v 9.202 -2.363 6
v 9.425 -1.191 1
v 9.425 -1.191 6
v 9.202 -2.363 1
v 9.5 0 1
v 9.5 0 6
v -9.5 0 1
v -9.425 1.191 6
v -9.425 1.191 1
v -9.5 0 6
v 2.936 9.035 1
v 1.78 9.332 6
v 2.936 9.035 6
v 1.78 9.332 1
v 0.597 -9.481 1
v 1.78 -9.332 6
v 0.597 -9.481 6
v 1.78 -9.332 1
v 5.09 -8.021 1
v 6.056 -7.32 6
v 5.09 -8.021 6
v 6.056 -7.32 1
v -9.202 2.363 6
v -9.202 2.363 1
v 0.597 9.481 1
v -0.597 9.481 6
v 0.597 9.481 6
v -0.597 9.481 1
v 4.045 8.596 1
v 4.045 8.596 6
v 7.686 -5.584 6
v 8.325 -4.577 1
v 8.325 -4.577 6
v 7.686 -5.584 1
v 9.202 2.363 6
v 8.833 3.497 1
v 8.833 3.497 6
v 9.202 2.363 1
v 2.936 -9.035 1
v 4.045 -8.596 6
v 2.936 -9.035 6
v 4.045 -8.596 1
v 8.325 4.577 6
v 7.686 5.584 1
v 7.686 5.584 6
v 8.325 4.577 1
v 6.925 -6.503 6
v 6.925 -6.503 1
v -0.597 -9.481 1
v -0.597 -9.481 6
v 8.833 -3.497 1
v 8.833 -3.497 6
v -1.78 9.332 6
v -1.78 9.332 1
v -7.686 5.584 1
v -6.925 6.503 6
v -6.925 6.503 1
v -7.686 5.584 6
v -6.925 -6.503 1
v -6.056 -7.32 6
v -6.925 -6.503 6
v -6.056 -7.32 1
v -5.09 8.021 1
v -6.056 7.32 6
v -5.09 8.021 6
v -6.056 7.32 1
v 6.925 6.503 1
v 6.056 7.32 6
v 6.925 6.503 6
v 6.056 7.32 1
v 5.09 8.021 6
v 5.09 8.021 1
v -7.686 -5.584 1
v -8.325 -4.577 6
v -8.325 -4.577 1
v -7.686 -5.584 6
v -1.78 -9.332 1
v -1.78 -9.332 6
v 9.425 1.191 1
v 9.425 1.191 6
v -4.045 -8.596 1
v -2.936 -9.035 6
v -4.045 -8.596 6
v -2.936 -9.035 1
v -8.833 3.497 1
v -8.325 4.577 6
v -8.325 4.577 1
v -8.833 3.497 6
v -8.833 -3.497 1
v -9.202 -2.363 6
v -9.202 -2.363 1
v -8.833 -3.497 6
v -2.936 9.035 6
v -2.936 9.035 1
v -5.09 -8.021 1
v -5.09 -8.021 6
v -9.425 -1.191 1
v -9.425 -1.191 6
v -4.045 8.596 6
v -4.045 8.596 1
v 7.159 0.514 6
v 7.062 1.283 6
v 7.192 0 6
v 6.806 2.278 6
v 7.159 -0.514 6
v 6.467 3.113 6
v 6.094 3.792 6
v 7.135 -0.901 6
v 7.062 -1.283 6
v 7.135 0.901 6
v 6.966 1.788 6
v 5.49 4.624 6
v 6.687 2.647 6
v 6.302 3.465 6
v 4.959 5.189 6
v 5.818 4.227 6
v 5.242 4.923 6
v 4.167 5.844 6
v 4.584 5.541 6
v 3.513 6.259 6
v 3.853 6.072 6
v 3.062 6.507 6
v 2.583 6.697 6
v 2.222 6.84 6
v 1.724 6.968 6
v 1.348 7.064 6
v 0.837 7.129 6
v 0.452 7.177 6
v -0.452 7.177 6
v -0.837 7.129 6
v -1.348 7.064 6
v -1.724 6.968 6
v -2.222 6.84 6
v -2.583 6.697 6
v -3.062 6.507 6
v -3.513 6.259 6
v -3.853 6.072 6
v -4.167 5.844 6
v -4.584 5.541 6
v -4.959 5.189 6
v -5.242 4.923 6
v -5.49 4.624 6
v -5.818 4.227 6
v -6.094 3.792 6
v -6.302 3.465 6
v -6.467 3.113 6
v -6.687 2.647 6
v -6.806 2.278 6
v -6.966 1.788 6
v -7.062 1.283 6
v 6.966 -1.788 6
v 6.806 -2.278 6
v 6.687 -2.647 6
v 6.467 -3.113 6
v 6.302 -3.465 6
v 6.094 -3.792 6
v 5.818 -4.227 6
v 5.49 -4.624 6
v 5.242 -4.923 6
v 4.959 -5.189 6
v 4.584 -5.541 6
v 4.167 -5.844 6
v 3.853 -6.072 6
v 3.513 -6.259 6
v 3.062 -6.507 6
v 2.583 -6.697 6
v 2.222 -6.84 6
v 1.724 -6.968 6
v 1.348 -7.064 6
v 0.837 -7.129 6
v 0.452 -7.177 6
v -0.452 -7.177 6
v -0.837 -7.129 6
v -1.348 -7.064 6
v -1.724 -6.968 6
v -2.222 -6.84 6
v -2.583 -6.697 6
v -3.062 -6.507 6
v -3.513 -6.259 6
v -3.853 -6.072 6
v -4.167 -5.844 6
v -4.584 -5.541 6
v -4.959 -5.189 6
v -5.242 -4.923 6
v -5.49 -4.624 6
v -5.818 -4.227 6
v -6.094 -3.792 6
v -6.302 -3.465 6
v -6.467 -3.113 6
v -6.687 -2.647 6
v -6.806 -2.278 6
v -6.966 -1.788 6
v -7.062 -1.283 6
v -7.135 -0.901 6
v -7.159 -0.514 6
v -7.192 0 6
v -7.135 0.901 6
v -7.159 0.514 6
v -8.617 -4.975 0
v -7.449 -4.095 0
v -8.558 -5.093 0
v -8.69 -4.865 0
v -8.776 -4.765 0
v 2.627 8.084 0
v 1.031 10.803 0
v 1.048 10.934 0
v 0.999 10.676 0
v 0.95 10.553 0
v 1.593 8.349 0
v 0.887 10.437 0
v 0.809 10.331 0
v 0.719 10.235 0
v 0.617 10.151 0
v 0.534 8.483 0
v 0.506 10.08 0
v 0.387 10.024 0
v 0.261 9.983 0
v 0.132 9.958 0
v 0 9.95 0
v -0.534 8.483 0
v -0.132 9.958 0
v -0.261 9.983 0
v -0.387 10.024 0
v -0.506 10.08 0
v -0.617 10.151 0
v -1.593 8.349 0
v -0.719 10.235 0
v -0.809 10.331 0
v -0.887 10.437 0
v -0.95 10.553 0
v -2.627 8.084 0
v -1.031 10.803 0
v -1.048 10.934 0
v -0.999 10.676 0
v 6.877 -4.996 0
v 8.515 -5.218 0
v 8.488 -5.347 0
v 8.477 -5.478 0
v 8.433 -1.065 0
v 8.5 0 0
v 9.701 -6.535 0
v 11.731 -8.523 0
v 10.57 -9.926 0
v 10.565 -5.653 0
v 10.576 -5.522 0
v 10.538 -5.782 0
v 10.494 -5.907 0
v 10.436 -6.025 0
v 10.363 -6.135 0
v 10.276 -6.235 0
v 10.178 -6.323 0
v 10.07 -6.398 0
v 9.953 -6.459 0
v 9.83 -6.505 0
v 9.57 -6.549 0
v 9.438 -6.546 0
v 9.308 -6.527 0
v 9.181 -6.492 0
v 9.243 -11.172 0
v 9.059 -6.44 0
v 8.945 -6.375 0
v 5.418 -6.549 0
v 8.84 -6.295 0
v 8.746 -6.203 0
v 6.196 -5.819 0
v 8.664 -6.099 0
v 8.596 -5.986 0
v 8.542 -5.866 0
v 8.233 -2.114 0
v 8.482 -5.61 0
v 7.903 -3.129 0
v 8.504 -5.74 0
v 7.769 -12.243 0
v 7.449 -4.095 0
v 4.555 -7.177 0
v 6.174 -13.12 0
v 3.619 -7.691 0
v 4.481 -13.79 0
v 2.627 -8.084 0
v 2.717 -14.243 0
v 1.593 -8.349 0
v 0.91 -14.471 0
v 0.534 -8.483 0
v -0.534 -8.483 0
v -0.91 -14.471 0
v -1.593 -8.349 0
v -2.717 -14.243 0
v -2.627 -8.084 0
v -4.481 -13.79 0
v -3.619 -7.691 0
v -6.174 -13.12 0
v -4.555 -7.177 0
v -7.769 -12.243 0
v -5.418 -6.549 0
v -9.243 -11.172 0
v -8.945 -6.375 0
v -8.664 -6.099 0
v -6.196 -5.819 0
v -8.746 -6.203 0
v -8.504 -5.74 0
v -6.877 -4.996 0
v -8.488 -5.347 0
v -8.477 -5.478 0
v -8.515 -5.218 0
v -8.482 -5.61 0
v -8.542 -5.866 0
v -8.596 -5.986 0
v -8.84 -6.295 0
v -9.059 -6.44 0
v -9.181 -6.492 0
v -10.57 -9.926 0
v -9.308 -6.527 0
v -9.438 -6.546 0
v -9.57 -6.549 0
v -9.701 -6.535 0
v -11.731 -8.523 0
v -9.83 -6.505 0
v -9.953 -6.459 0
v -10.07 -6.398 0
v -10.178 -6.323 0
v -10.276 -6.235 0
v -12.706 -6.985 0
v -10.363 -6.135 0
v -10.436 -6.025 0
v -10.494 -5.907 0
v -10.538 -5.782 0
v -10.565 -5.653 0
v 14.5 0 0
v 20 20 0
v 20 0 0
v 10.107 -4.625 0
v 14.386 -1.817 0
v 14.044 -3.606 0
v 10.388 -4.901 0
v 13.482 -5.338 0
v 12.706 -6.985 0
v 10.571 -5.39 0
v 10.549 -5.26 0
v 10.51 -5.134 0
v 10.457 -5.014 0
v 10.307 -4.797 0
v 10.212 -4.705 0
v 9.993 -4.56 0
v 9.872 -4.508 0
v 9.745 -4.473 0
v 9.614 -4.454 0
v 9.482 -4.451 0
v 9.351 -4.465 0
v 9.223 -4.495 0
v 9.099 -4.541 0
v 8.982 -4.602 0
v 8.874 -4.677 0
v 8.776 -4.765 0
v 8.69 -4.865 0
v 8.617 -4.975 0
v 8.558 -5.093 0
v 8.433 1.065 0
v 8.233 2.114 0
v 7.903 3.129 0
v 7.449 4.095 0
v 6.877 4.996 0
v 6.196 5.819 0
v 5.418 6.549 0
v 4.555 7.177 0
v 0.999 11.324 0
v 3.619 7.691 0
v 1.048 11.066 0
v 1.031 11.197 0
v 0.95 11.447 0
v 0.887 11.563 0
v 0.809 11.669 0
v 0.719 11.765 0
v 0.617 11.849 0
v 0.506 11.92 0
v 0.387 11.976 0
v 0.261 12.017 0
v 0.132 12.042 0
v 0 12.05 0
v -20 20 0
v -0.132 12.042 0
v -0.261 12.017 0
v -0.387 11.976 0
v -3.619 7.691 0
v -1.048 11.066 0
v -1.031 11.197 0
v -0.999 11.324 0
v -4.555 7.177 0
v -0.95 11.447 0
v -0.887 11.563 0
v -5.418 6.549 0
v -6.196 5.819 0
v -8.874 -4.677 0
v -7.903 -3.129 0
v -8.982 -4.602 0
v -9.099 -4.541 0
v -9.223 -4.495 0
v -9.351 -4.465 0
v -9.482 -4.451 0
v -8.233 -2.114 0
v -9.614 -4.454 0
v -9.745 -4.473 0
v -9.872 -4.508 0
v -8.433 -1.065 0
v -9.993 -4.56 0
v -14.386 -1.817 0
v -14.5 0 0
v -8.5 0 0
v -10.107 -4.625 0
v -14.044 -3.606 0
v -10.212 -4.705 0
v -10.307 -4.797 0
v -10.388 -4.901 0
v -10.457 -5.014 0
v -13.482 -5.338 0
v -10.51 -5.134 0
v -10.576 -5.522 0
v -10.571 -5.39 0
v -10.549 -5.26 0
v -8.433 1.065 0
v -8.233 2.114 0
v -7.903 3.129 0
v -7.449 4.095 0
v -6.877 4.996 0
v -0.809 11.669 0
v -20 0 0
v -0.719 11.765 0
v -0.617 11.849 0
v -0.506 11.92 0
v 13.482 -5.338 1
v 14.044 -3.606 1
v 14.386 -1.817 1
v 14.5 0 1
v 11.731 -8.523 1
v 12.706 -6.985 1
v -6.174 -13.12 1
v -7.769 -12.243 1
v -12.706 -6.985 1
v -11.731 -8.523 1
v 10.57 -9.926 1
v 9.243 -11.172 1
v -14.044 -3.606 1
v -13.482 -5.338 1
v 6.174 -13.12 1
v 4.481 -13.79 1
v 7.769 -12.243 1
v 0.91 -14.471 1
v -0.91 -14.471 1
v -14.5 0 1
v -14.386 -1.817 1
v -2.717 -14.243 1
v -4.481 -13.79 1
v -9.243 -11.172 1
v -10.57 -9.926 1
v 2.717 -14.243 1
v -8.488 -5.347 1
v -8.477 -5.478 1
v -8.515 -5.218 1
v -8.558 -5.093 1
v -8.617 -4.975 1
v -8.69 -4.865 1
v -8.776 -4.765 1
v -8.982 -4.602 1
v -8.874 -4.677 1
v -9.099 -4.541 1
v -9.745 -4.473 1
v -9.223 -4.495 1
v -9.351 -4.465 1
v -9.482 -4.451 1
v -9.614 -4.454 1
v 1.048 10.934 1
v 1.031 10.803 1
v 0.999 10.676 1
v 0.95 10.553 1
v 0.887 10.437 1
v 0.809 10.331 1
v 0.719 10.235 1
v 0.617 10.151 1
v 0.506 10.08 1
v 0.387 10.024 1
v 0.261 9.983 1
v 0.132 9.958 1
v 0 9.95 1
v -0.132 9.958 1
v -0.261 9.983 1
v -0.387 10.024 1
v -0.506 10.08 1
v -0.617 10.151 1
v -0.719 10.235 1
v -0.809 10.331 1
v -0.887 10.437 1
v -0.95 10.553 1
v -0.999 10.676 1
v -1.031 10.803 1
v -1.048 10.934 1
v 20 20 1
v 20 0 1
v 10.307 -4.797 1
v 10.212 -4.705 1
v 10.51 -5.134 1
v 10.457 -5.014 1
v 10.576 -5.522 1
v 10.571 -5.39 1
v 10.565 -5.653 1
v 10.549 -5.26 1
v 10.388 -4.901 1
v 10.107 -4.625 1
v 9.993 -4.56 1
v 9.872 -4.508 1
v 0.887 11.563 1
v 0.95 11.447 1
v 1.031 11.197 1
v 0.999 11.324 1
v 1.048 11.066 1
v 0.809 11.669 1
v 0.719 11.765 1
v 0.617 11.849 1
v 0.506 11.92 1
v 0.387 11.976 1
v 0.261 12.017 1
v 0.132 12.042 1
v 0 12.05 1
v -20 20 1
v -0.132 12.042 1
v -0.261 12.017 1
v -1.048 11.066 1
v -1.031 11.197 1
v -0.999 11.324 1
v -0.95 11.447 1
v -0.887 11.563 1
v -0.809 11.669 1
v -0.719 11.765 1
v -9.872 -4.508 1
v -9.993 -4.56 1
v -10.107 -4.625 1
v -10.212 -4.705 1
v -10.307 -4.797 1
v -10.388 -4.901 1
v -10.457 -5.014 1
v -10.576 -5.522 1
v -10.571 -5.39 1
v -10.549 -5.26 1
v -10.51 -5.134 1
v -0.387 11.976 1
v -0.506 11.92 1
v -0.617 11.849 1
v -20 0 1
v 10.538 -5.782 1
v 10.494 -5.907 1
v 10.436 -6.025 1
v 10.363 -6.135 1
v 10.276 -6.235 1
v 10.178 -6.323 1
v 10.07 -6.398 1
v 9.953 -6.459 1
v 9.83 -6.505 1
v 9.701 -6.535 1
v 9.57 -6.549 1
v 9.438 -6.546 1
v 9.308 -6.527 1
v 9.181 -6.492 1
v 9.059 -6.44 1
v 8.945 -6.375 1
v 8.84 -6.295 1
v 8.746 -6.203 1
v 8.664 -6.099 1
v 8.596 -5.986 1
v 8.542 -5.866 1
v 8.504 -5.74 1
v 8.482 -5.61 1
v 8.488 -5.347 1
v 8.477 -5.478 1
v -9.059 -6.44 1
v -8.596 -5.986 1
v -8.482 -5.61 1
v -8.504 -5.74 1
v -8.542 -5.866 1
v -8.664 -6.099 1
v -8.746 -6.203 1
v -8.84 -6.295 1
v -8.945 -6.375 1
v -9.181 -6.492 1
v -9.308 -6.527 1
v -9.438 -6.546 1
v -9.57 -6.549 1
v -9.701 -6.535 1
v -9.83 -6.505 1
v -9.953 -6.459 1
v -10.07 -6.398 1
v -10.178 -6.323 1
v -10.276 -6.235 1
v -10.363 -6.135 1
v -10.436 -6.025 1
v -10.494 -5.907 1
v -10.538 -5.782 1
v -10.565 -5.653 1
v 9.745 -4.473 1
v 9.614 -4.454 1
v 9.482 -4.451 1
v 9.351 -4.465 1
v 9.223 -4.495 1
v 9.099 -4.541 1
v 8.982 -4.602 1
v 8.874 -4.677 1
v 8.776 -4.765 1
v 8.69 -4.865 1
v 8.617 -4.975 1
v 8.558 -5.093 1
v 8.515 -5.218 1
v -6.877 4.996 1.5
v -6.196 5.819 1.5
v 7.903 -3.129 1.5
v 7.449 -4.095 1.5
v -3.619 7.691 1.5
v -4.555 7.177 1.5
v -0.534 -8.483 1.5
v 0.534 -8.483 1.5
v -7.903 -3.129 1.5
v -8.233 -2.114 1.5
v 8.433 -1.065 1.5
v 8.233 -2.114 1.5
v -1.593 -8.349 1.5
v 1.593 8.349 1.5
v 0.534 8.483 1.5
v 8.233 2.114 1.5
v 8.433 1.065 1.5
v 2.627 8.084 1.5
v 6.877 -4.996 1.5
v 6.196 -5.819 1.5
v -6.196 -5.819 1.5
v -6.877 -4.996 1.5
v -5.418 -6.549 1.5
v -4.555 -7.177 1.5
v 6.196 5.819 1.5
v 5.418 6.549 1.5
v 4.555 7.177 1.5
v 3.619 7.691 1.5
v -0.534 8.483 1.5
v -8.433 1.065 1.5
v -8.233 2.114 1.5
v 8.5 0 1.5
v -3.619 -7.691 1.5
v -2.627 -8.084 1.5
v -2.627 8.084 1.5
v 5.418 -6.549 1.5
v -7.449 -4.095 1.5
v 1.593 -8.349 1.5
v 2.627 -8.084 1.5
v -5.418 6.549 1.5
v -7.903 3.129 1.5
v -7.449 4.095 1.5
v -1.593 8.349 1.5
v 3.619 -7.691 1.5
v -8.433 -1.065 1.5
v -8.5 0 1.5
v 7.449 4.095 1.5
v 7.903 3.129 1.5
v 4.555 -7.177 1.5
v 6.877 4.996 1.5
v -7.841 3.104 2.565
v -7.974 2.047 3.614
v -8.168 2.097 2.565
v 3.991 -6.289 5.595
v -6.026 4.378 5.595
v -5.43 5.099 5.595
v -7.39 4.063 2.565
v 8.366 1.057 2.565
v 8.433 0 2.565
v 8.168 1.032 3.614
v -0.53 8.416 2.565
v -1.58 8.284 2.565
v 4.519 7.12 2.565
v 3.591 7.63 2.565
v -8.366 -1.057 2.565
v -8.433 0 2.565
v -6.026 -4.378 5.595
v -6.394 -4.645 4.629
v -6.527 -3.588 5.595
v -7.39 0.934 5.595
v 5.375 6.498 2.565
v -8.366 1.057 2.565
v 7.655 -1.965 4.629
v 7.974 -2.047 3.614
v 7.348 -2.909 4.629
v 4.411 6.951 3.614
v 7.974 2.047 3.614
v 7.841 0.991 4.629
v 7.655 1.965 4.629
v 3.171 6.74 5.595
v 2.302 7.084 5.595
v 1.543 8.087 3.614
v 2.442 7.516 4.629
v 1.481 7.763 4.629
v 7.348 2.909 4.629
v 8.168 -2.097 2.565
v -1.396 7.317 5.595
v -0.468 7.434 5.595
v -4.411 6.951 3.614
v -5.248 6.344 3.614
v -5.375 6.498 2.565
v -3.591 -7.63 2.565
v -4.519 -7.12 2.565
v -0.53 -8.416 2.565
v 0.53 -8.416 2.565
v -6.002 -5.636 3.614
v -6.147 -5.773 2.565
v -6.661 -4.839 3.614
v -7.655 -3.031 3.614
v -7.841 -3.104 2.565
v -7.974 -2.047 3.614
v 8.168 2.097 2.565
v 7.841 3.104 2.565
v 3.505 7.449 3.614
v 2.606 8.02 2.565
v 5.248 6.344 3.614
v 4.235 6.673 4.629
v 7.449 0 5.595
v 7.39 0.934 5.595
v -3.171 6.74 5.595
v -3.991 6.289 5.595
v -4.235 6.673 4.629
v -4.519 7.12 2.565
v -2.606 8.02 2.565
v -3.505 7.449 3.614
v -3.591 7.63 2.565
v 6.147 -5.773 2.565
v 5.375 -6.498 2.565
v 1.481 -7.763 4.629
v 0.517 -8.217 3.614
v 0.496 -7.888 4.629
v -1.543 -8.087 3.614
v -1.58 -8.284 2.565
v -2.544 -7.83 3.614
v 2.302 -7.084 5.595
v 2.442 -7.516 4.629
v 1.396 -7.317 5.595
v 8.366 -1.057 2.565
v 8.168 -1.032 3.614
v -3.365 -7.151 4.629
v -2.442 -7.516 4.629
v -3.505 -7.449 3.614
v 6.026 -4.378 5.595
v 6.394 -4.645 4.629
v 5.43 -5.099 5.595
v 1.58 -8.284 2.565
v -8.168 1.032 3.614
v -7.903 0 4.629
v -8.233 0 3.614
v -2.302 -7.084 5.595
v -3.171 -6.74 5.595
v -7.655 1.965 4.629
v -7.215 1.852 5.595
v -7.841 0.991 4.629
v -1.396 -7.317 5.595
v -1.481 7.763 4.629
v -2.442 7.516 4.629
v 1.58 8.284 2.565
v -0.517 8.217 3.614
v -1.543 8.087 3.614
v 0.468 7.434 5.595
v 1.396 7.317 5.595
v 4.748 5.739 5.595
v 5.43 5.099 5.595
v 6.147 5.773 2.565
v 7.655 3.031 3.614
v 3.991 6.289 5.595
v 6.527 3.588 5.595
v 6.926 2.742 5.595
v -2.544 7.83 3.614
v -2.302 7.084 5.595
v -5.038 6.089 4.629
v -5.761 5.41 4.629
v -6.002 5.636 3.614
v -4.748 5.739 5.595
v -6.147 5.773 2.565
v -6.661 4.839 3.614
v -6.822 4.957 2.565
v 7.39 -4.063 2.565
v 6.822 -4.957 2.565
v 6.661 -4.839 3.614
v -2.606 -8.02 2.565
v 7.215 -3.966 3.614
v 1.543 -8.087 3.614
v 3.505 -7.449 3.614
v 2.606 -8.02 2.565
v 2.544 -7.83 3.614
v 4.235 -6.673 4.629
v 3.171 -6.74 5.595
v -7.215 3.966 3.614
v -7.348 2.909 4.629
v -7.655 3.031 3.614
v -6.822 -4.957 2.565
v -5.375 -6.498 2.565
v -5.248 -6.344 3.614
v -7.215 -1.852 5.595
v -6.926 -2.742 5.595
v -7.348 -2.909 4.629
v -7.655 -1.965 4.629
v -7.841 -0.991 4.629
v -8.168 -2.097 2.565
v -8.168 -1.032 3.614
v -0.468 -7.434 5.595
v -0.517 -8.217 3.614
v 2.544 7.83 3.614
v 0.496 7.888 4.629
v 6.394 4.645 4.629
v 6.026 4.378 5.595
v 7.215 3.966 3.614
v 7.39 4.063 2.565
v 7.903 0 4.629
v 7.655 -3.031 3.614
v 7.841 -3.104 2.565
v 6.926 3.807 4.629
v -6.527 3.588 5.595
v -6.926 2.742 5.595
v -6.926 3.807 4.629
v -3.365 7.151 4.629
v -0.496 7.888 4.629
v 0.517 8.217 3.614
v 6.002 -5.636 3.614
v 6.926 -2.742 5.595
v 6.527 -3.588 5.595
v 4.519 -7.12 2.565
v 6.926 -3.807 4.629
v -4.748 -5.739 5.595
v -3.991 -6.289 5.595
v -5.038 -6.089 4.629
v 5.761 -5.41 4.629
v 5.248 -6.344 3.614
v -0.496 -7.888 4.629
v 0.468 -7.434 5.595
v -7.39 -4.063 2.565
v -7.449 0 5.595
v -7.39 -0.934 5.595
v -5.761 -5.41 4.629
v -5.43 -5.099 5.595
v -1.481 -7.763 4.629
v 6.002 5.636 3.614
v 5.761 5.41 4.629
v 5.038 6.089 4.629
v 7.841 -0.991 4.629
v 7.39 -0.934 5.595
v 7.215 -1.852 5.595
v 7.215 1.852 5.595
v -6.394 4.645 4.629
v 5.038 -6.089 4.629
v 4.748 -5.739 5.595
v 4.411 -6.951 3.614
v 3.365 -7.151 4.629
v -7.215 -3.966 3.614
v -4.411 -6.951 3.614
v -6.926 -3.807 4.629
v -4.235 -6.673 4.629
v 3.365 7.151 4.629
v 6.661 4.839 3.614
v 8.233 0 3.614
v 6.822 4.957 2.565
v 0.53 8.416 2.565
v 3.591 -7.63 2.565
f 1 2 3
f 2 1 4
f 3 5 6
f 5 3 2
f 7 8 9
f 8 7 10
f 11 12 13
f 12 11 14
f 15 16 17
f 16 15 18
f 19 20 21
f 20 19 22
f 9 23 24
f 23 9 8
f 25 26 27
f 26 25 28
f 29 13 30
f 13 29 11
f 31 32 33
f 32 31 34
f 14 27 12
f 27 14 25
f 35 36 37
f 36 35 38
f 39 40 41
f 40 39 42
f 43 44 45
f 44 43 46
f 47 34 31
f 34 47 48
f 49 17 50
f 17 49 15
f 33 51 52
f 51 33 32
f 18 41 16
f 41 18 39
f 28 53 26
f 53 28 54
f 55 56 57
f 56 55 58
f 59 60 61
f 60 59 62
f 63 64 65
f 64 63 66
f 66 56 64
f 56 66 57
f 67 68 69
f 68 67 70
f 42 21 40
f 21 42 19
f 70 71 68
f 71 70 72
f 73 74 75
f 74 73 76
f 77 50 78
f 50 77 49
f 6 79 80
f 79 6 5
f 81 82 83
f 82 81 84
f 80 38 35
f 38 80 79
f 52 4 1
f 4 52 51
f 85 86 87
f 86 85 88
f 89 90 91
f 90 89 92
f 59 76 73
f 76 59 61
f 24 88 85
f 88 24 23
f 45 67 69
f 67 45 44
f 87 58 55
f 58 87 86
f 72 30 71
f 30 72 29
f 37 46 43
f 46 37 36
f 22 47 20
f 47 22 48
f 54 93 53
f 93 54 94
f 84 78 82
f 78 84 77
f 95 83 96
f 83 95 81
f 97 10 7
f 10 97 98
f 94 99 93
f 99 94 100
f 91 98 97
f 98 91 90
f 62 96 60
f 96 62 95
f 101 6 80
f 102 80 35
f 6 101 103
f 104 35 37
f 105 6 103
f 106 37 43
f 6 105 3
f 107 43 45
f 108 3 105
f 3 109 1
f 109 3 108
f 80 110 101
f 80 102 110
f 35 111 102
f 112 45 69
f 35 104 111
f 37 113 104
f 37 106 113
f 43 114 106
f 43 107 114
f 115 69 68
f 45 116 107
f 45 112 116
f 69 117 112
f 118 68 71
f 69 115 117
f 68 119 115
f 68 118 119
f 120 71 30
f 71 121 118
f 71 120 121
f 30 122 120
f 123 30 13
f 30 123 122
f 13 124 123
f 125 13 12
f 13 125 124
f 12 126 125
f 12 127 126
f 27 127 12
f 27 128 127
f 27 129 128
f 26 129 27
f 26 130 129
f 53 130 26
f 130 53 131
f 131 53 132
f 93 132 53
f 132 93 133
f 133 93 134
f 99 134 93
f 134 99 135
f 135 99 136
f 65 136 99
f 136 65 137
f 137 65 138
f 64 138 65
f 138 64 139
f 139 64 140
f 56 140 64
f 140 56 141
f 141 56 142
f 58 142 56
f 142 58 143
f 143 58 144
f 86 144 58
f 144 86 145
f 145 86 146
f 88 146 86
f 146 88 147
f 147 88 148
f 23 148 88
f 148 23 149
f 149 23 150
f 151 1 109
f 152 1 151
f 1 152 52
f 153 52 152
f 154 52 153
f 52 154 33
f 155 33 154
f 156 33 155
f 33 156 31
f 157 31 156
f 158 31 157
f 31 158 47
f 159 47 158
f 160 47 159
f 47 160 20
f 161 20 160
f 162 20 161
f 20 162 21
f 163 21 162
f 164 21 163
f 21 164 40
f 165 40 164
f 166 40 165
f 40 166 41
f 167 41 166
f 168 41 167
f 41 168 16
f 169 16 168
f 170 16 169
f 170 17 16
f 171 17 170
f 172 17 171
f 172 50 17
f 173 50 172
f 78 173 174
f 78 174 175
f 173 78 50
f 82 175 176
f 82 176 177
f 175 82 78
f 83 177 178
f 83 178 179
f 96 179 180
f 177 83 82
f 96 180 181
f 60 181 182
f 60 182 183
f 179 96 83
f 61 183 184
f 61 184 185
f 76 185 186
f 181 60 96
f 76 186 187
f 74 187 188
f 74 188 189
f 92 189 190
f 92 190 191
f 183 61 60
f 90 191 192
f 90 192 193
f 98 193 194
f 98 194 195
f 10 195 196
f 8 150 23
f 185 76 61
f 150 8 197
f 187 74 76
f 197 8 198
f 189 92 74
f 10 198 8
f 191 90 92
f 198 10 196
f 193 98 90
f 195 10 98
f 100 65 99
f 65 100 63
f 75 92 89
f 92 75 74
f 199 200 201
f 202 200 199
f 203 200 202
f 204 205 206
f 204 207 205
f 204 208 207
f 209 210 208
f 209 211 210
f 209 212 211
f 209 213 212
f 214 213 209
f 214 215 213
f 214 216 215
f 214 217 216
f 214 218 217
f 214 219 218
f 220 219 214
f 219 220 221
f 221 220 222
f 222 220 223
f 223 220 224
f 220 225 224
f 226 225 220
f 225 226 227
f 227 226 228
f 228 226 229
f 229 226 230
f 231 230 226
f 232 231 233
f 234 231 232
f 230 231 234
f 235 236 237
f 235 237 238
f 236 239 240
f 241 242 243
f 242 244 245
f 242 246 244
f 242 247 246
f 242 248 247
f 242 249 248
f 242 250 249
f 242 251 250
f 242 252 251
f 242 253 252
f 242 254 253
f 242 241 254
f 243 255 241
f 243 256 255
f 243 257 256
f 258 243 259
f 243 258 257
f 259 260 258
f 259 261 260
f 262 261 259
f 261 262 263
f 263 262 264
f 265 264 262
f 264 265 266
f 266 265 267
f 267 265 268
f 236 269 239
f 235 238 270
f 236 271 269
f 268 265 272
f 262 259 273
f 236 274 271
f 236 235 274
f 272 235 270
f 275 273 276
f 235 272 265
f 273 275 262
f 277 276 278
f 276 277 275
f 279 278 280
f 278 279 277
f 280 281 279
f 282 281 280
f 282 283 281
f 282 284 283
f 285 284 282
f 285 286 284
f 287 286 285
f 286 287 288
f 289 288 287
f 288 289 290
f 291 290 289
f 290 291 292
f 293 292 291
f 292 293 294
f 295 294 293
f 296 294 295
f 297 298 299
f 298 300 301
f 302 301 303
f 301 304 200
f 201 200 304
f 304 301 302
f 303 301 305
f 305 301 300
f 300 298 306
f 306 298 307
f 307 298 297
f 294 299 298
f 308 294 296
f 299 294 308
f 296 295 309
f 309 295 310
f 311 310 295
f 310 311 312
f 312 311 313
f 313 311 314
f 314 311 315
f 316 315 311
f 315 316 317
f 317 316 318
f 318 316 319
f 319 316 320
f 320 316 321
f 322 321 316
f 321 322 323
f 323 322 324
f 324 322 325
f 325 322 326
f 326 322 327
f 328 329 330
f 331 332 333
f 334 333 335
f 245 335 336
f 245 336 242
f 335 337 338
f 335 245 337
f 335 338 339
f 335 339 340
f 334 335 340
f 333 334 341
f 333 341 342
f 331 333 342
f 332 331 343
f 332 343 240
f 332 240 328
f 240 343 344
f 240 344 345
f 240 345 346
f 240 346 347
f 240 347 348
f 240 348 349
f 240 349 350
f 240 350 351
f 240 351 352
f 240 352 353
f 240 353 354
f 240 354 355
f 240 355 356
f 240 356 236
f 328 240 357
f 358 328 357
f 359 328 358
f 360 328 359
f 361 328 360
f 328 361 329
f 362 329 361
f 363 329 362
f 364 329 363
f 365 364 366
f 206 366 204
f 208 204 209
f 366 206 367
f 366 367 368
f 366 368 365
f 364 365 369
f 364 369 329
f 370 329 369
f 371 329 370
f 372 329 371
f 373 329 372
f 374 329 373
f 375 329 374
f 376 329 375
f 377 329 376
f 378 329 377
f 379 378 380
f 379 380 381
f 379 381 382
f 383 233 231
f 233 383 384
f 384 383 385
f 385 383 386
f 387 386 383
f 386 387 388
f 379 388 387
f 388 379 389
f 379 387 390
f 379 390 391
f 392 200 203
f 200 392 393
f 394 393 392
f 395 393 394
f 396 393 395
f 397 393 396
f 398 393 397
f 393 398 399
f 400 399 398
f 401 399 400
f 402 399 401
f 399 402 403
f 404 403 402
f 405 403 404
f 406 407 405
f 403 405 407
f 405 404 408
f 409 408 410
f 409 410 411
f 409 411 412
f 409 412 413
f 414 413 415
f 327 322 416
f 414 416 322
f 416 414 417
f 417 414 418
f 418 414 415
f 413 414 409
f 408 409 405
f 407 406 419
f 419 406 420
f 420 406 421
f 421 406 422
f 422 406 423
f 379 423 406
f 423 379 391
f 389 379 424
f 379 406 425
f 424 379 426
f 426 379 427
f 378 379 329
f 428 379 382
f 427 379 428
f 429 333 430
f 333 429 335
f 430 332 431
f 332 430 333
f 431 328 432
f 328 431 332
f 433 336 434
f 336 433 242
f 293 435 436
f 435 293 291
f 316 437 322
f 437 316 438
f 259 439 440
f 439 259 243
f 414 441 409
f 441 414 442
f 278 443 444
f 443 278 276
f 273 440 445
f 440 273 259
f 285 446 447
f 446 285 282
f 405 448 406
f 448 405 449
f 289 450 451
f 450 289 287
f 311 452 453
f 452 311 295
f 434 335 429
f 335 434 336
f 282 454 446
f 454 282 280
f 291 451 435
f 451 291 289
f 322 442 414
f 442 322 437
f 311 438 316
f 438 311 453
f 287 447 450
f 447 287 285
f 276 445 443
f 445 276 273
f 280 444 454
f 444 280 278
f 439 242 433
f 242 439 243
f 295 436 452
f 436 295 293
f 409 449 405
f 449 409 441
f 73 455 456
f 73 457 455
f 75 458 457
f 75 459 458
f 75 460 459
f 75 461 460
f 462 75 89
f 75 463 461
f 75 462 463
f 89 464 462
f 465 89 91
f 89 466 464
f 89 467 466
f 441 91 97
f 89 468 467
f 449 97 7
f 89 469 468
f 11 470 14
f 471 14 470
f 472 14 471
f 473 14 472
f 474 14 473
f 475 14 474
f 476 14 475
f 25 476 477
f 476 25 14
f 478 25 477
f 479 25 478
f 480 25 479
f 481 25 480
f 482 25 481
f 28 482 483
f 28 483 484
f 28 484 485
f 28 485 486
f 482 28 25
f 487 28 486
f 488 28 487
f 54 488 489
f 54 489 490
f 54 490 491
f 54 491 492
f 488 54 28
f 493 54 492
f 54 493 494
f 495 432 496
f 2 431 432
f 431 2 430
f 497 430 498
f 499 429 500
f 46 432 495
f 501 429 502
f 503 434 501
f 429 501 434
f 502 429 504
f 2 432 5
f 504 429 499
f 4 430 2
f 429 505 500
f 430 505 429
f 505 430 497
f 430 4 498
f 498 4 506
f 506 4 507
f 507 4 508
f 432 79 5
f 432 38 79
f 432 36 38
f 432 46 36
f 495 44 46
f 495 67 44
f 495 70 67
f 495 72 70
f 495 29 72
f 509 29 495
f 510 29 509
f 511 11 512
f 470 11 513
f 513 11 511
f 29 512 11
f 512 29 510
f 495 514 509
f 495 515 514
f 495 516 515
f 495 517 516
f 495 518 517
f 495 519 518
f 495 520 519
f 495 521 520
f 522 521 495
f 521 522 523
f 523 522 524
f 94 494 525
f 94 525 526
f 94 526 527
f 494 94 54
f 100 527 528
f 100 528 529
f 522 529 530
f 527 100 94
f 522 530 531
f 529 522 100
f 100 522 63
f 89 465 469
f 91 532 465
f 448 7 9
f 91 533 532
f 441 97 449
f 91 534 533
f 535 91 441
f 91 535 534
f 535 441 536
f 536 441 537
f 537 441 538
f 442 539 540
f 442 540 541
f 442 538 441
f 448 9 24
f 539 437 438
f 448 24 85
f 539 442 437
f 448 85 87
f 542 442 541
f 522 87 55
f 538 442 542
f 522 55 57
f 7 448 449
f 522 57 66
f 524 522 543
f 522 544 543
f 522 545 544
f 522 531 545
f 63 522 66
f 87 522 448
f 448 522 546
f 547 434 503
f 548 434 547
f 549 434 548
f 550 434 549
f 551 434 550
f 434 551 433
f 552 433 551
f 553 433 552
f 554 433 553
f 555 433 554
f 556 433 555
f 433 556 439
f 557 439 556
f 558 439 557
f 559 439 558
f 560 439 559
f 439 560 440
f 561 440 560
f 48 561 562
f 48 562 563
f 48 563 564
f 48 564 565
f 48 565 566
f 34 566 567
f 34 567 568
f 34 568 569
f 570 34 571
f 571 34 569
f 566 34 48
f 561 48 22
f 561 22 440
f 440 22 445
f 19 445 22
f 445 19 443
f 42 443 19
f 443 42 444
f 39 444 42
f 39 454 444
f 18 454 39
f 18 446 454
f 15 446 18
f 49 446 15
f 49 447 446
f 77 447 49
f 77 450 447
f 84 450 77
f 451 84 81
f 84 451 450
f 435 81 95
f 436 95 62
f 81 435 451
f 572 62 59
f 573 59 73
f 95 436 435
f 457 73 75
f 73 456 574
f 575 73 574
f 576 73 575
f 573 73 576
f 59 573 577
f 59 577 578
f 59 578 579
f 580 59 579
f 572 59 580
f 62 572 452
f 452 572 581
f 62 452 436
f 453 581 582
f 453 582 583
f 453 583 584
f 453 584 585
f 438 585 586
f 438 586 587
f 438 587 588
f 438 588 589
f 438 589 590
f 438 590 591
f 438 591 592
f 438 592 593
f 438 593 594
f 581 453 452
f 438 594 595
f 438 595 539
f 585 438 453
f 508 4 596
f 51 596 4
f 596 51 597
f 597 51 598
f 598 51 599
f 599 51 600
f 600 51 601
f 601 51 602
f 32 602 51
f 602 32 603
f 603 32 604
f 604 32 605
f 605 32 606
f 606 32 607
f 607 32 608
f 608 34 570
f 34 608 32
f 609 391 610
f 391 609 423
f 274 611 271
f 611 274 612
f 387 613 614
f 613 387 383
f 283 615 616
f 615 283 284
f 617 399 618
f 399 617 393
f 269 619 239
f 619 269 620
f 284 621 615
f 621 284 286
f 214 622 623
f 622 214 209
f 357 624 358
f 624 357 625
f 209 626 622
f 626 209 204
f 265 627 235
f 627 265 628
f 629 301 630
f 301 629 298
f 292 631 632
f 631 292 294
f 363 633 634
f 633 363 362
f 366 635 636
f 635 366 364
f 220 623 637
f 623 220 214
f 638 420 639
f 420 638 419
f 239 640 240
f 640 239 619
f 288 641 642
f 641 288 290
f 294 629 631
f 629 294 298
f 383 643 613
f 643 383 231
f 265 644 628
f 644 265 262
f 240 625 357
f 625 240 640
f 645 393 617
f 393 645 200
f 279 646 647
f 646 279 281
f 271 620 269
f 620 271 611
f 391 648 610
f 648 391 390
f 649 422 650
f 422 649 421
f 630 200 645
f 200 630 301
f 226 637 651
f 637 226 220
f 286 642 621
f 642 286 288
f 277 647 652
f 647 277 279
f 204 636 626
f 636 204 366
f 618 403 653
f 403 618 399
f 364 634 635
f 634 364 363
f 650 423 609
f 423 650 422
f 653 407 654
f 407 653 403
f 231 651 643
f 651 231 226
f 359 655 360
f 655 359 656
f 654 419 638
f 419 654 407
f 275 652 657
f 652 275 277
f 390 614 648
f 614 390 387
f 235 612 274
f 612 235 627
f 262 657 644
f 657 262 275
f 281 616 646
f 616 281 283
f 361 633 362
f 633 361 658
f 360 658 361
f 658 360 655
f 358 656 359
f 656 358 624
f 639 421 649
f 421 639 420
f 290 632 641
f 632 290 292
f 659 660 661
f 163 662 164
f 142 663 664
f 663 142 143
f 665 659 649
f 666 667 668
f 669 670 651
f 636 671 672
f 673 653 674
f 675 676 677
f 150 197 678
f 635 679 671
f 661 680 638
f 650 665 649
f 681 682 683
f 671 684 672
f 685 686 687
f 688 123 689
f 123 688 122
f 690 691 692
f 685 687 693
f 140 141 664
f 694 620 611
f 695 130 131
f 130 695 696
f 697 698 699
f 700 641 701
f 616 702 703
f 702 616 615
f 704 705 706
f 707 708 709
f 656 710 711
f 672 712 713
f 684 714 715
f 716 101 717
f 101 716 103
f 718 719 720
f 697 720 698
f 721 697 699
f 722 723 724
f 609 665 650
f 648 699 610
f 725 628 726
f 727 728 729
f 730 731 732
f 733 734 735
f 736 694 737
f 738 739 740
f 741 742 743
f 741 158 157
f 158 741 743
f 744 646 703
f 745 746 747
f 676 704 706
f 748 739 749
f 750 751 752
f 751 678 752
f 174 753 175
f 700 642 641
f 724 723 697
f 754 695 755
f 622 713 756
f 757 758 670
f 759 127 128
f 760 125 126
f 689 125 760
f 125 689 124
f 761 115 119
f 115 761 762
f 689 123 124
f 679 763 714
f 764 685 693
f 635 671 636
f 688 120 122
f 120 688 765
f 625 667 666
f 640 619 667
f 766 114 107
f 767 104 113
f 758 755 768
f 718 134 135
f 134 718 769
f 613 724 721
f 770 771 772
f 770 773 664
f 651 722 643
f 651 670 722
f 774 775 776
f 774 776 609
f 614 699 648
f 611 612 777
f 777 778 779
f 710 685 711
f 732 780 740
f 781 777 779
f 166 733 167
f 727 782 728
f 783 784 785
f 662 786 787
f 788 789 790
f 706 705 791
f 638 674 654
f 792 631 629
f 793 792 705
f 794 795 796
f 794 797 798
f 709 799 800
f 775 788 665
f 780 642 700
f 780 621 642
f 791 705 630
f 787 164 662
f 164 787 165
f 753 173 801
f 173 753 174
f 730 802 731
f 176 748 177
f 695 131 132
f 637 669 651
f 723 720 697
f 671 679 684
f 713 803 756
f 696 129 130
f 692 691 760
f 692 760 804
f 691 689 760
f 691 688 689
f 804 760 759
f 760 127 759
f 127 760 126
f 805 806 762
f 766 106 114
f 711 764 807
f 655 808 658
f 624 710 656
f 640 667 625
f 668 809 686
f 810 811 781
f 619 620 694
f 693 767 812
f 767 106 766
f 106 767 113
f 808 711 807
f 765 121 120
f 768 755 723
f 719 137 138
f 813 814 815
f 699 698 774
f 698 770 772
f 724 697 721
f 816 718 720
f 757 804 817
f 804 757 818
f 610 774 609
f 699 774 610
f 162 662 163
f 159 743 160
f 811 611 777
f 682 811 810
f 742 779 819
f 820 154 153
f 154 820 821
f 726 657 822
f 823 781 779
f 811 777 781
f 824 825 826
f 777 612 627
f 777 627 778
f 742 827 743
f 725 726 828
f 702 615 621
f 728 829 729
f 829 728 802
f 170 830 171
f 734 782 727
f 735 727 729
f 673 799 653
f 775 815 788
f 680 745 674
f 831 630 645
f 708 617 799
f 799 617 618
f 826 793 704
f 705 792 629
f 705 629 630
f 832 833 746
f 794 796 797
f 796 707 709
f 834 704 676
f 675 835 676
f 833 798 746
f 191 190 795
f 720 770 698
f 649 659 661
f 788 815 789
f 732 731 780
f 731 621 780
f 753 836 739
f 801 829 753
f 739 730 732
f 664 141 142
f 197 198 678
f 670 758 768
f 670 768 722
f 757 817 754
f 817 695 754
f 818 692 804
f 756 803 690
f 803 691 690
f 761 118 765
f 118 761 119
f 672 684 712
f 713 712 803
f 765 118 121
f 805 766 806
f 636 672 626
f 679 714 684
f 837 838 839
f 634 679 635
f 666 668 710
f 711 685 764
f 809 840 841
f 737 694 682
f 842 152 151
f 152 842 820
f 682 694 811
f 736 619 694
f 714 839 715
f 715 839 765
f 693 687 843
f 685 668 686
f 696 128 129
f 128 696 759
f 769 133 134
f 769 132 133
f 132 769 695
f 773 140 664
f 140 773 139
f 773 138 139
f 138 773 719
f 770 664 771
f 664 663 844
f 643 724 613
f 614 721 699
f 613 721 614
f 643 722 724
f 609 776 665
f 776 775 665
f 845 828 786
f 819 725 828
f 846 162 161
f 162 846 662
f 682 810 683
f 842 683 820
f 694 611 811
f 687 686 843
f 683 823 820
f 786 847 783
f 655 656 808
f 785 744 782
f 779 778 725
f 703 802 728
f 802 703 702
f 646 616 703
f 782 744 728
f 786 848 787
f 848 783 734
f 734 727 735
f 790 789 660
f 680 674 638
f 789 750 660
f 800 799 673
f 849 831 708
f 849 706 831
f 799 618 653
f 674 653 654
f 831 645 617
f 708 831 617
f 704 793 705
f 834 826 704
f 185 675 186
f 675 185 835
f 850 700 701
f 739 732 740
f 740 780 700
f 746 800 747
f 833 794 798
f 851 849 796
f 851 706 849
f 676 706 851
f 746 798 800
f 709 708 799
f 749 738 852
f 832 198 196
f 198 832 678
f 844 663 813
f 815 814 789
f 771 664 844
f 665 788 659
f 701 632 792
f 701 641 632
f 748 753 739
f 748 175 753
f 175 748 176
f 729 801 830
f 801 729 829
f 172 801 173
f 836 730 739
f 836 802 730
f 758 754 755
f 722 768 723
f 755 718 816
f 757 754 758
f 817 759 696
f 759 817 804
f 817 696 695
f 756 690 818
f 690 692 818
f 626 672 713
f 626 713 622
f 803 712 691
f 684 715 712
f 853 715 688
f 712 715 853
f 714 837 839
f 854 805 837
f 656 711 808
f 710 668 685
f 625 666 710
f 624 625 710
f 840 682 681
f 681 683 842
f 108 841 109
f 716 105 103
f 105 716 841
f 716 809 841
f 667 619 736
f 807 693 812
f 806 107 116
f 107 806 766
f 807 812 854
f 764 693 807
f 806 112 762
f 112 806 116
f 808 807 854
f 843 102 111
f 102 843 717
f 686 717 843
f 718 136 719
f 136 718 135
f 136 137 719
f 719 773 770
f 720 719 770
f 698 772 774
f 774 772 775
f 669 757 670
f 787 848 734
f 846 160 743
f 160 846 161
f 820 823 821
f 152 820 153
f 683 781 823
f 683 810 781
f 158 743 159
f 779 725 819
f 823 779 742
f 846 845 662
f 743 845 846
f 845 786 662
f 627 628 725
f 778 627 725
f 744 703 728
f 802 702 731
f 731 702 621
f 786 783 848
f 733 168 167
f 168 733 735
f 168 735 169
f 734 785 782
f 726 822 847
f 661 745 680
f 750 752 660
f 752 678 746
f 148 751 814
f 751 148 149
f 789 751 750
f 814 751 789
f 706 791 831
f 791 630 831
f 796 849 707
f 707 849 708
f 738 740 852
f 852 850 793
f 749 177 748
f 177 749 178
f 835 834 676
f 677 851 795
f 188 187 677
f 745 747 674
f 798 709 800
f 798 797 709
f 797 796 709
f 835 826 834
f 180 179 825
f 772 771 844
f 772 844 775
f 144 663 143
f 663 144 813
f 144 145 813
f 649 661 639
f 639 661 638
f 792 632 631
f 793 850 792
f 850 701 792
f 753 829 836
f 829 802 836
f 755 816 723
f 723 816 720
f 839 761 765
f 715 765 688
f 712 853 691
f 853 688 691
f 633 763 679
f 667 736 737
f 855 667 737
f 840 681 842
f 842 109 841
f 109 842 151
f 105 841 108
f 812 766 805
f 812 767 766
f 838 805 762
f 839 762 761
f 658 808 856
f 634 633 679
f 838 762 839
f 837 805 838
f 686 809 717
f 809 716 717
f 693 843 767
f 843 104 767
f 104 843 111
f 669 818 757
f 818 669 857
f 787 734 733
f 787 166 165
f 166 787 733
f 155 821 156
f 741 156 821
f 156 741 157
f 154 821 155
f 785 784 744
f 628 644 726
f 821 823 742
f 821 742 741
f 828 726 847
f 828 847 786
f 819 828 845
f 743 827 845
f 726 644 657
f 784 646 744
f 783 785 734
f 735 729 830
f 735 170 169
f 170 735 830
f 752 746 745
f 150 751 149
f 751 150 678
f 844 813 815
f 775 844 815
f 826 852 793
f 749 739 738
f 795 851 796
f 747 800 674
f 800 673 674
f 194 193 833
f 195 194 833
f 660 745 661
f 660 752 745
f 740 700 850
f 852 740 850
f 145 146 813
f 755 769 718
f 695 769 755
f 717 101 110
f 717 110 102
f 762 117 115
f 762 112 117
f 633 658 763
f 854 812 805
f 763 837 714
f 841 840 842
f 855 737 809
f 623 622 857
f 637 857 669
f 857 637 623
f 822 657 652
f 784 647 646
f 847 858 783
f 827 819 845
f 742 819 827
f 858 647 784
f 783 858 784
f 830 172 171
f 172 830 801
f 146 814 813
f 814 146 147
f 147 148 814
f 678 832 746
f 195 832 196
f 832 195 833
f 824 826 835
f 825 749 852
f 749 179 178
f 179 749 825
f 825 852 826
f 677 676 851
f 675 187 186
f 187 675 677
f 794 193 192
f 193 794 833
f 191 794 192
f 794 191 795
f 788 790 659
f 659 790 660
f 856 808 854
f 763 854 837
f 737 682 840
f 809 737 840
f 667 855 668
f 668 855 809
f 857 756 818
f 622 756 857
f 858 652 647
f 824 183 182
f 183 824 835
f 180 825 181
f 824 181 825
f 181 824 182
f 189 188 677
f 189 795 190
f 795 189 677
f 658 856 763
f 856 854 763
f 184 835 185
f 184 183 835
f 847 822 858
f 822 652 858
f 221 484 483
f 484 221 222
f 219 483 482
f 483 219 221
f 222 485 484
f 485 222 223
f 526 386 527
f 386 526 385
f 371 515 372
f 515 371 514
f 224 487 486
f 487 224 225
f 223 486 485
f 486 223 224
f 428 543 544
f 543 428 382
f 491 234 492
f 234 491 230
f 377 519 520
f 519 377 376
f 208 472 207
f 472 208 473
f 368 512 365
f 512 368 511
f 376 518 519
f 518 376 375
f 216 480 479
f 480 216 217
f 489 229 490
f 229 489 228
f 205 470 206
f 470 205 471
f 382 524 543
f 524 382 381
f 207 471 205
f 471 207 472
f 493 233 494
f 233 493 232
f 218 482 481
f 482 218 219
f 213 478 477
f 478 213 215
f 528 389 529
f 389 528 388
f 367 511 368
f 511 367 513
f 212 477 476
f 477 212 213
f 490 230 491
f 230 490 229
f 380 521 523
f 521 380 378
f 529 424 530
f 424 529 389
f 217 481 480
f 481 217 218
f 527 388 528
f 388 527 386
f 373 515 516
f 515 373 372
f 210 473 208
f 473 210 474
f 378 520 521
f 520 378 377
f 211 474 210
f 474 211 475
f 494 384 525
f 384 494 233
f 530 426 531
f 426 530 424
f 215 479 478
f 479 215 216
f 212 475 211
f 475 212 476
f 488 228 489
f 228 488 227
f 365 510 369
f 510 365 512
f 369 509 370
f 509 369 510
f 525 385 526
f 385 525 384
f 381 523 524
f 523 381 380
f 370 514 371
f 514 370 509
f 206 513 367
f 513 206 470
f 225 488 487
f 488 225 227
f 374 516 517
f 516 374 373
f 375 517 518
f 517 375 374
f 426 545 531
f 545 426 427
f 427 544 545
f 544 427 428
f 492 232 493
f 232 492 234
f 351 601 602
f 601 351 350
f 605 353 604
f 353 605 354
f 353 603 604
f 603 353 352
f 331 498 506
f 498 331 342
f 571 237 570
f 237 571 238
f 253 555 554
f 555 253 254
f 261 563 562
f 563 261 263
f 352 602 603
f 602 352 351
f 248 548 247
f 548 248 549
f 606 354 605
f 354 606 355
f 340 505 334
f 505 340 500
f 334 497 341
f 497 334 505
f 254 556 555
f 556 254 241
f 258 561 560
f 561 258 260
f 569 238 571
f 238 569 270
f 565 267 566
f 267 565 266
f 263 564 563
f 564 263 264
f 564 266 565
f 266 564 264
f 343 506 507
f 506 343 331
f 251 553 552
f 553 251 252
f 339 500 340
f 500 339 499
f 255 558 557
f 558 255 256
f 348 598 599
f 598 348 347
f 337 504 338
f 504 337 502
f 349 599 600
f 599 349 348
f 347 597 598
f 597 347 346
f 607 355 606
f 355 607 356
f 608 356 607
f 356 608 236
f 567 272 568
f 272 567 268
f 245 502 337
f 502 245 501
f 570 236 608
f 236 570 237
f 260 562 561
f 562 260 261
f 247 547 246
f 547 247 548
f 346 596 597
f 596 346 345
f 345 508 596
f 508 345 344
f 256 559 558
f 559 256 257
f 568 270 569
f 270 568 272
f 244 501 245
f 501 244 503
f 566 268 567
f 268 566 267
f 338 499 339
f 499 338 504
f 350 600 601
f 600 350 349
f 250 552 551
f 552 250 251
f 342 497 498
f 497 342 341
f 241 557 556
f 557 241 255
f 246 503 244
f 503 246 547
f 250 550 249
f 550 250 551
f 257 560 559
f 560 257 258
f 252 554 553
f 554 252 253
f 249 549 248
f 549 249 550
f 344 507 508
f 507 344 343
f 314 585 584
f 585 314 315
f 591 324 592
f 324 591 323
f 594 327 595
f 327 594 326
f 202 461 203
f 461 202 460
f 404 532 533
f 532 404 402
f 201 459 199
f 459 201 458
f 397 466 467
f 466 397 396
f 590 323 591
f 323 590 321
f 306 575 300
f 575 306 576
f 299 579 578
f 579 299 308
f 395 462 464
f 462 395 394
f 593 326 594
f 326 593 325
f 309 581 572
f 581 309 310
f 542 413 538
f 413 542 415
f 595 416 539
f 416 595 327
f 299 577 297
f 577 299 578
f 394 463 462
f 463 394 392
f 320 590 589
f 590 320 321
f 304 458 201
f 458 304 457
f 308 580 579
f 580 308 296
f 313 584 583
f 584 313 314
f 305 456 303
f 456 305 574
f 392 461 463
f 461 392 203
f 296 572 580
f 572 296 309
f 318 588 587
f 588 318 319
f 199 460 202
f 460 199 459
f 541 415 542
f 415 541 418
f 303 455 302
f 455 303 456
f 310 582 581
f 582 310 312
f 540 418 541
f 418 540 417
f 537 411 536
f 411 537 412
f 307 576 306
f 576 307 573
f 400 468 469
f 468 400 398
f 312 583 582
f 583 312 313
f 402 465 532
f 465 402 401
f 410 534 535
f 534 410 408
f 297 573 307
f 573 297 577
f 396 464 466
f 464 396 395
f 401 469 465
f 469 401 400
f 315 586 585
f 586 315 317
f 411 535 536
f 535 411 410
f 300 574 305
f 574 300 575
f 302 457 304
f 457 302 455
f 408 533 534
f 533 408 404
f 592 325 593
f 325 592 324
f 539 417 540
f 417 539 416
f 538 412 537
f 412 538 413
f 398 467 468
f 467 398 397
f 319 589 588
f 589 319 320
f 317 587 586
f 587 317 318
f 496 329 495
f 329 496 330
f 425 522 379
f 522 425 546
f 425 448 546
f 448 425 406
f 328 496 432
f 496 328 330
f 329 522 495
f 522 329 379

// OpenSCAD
// Dreamster parametric prototype chassis V2.0

// Default resolution (set it lower for faster rendering)
$fn = 80;

// Chassis parameters
depth = 95;
width = 90;
height_wall = 25+8+1.5;
thickness = 3;
thickness_wall = 3.5;

mount_holes_diameter = 3;
hole_width = 40;
hole_depth = 52;
hole_pos_y = 11;

corner_radius = 10;
slope = 5;


//---------------------------------

dreamster_base_r = 140/2;
dreamster_base_thickness = 3;

arduino_base_depth = 84;
arduino_base_width = 65;
arduino_base_height_wall = 25+8+1.5;
arduino_base_thickness = 3;

battery_hole_depth = 60;
battery_hole_width = 37.5;
battery_support_height = 28;

wheel_hole_depth = 20;
wheel_hole_width = 70;
wheel_hole_thickness = dreamster_base_thickness*1.1;

medida_servo = 23.6;
distancia_agujeros_servo = 28.6;

motor_x = 3;
motor_y = distancia_agujeros_servo-medida_servo;
motor_z = 12;
motor_axe_disp = 5;
motor_tab = 3;

ball_caster_r = 8; // canica d = 15 mm
ball_caster_center = 56;
ball_caster_support_holes = 11;

distance_to_floor = 12; // measured from the top of the base (aka includes the thickness)
ball_caster_height = distance_to_floor-dreamster_base_thickness-3;

//---------------------------------

module logo() {
   linear_extrude(height = 1.2,  convexity = 10)
        import(file="dreamster_logo.dxf");
}


module motor_support() {
  union(){
    difference() {
      cube([motor_x, motor_y, motor_z]);
      translate([-motor_x/2, motor_y/2, motor_z/2])
        rotate([0, 90, 0])
          cylinder(r = 1.3, h = 6);
    }
    difference() {
      cube([6.3, motor_y*2, motor_z/3]);
      translate([7, 2*motor_y+0.1, 4.1])
        rotate([90, 0, 0])
          cylinder(r = 4, h = motor_y*2.1);
    }
  }

  translate([-motor_tab,motor_y,0])  
  rotate([0,0,180])
  union(){
    difference() {
      cube([motor_x, motor_y, motor_z]);
      translate([-motor_x/2, motor_y/2, motor_z/2])
        rotate([0, 90, 0])
          cylinder(r = 1.3, h = 6);
    }
    difference() {
      translate([0, -motor_y, 0])
        cube([6.3, motor_y*2-0.1, motor_z/3]);
      translate([7, motor_y, 4.1])
        rotate([90, 0, 0])
          cylinder(r = 4, h = motor_y*2.1);
    }
  }
  
  translate([-motor_tab-motor_x,motor_y,0])
    cube([motor_tab+motor_x*2,motor_y,motor_z]);
  
}

// simple holder for ball caster
module ball_caster_holder() {
  difference() {
    union() {
      //difference() {
        //
        translate([0, 0, -ball_caster_height/2])
          cylinder(h=ball_caster_height,r=ball_caster_r+1.5,$fn=50,center=true);
        //translate([0, 0, -ball_caster_height/2+1])
          //cube([ball_caster_r*2+1,ball_caster_r*2+1,ball_caster_height-2],center=true);
      //}
      // base disc
      translate([0, 0, -0.5])
        cylinder(h=1,d=ball_caster_r*2+3+10,$fn=50,center=true);

    }
  
    translate([0, 0, ball_caster_r+dreamster_base_thickness-distance_to_floor-0.5]){
      cylinder(h=ball_caster_height, r= ball_caster_r+0.5, $fn=50);
      sphere(r = ball_caster_r+0.5, $fn=50); 
    }
    translate([0,0,0]) {
      for(i=[1:3])
        rotate([0,0,120*i-30])
          translate([-ball_caster_support_holes, 0, -1-0.05])
            cylinder(d = 2.1, h = 1.1, $fn=50); 
    }
    
  }
}

module ball_caster_holder_sensor() {
  ball_caster_holder();
  difference(){
    translate([-20,-20,0-1])cube([40,20,1]);
    translate([0, 0, -1.1])
      cylinder(h=1.2,d=ball_caster_r*2+3+10,$fn=50);
  }  
}

//sphere and 3 holes for support used in base
module ball_caster() {
  translate([0, 0, ball_caster_r+dreamster_base_thickness/2-distance_to_floor])
    sphere(r = ball_caster_r, $fn=50);
  translate([0,0,0]) {
    for(i=[1:3])
      rotate([0,0,120*i-30])
        translate([-ball_caster_support_holes, 0, -dreamster_base_thickness/2-0.05])
          cylinder(d = 2.1, h = dreamster_base_thickness*1.1, $fn=50); 
  }
}

module dreamster_base_holes() {
  translate([0, ball_caster_center, 0]) ball_caster();
  rotate(180,0,0)
    translate([0, ball_caster_center, 0]) ball_caster();
  
  //holes for arduino base
  translate([37.5/2, 60/2 + 3.5-6, -dreamster_base_thickness/2-0.1])
    cylinder(r = 1.6, h = battery_support_height+dreamster_base_thickness+0.2);
  translate([-37.5/2, -(60/2 + 3.5 + 5.25)-6, -dreamster_base_thickness/2-0.1])
    cylinder(r = 1.6, h = battery_support_height+dreamster_base_thickness+0.2);
  
  // floor sensors holes
  translate([0,28,0])
    cube([20,6,dreamster_base_thickness*1.1], center=true);
  
  // battery hole
  translate([0, -9, 0])
    cube([battery_hole_width, battery_hole_depth-2, dreamster_base_thickness + 0.2], center=true); 
  
}


module wheels_holes() {
  intersection(){
    union(){
      translate([-(wheel_hole_depth/2+35.85+10), 0, 0])
        cube([wheel_hole_depth, wheel_hole_width, wheel_hole_thickness],center=true);
      translate([wheel_hole_depth/2+35.85+10, 0, 0])
        cube([wheel_hole_depth, wheel_hole_width, wheel_hole_thickness],center=true);
    }
    cylinder(h=wheel_hole_thickness, r=dreamster_base_r-6, center=true);
  }
}

module battery_supports() {
  translate([37.5/2, 60/2 + 3.5, 0]) {
    union() {
      cube([14, 7, battery_support_height], center=true);           
        translate([3.5, -3.5, 0])
          cube([7, 14, battery_support_height], center=true);          
    }
  }

  translate([-battery_hole_width/2, -(battery_hole_depth/2 + 3.5 + 5.25), 0]) {
    rotate([0, 0, 180]) {
      union() {
        cube([14, 7, battery_support_height], center=true);           
          translate([3.5, -3.5, 0])
            cube([7, 14, battery_support_height], center=true);
      }
    }
  }
}



module dreamster_base() {
  difference() {
    union() {
      cylinder (h = dreamster_base_thickness, r = dreamster_base_r, center = true); 
          // LOGO
      translate([0, -6, dreamster_base_thickness/2 + battery_support_height/2 ])
        battery_supports();
      translate([-dreamster_base_r/2.9,dreamster_base_r/1.68,dreamster_base_thickness/2])
        rotate([0,0,216]) resize([48,0,1], auto=true) logo();

      //motor tabs
      translate([0,motor_axe_disp,0]){
        translate([-dreamster_base_r/1.80+motor_x, medida_servo/2,1.4])
          motor_support();
        translate([-dreamster_base_r/1.80+motor_x-motor_tab/2, -medida_servo/2-motor_y/2,1.4])
          rotate(180,0,0)
            translate([motor_tab/2,-motor_y/2,0])
              motor_support();

        translate([+dreamster_base_r/1.80-motor_x+motor_tab, medida_servo/2,1.4])
          motor_support();

        translate([+dreamster_base_r/1.80-motor_x+motor_tab/2, -medida_servo/2-motor_y/2,1.4])
          rotate(180,0,0)
            translate([motor_tab/2,-motor_y/2,0])
              motor_support();
      }
      
      // enclose for ball caster
      *for (i=[0,1])
      rotate([0,0,180*i])   
      translate([0, ball_caster_center, 0])
        intersection(){
          translate([0, 0, ball_caster_r+dreamster_base_thickness/2-distance_to_floor])
            sphere(r = ball_caster_r+2, $fn=50);
          translate([0,0,(ball_caster_r+2)/2])
            cube([2*(ball_caster_r+2)+1,2*(ball_caster_r+2)+1,(ball_caster_r+2)+1], center=true);
        }
    }
    
    dreamster_base_holes();
    wheels_holes();
  }
}
 
//------------------------

module arduino_holes() {
  translate([17, -depth/2 + 10.5, -thickness/2-1])
    cube([10, 12, thickness+2], center=false);
  translate([2, -hole_pos_y, 0])
    cube([hole_width, hole_depth, thickness+2], 1, center=true);
  translate ([20, -depth/2 + 74, 0])
    cylinder (h = arduino_base_thickness+0.2, r = 1.8,center=true);
  translate ([20-1.1*25.4, -depth/2 + 74, 0])
    cylinder (h = arduino_base_thickness+0.2, r = 1.8,center=true);
  translate ([-22.5, -depth/2 + 74-25.4*2, 0])
    cylinder (h = arduino_base_thickness+0.2, r = 1.8,center=true);
  translate([-37.5/2+1, -(60/2 + 3.5 + 5.25)-6-1, 0])
    cylinder(h=arduino_base_thickness+0.2, r = 1.8, center=true);
}

module arduino_base() {
  difference() {
    translate([2,-9,0])
      cube([arduino_base_width, arduino_base_depth, arduino_base_thickness], center=true);   
    arduino_holes();
  }
}


module show() {
  rotate([0,0,180]) dreamster_base();
  translate([0, ball_caster_center, -dreamster_base_thickness/2])
    ball_caster_holder_sensor();
  rotate([0,0,180]) translate([0,ball_caster_center, -dreamster_base_thickness/2]) ball_caster_holder ();
  translate([-1.15, 1, battery_support_height+2])
    arduino_base();
}

module print_base() {
  rotate([0,0,180]) dreamster_base();
}

module print_accesories() {

// arduino base	
*  translate([0,0,arduino_base_thickness/2])
    arduino_base();

// ball_caster_holder_sensor
//  translate([-2, -12, ball_caster_height])
    rotate([180,0,0])
      ball_caster_holder_sensor();

// ball_caster_holder
*//  translate([50, -10, ball_caster_height])
    rotate([0,0,90])
      ball_caster_holder();

// ball_caster_holder
*//  translate([2, -10, 0])
    rotate([0,180,0])
      ball_caster_holder();

}

print_accesories();
//print_base();
//show();
